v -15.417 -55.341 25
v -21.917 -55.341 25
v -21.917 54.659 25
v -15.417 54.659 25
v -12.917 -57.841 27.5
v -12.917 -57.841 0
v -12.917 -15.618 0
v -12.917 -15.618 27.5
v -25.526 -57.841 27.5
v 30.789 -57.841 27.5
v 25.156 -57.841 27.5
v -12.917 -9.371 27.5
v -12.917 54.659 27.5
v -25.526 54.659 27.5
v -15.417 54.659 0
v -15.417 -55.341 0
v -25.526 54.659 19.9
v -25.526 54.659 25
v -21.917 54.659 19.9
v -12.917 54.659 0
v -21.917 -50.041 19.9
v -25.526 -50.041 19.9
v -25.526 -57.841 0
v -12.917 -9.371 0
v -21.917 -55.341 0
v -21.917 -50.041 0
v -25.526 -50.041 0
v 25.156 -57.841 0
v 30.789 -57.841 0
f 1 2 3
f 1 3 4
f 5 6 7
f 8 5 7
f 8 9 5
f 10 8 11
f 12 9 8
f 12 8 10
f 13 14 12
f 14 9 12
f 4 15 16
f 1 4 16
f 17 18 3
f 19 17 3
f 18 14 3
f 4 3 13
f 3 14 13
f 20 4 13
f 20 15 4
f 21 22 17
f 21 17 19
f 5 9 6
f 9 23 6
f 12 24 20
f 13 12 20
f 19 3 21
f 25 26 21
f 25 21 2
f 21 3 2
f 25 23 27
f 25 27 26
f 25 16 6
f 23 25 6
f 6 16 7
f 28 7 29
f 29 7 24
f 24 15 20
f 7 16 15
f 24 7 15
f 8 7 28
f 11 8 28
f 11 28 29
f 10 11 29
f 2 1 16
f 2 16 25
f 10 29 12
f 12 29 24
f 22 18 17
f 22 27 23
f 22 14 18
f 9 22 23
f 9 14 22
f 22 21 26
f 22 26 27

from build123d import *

# Parameters (mm, degrees)
F1_DEPTH = 25
F3_DEPTH = 2.5
F4_W     = 3.6095191927
F4_H     = 104.7
F5_DEPTH = 5.1
F6_DEPTH = 2.5


with BuildPart() as f1:
    # F0 (on Top) → F1 (new body)
    with BuildSketch(Plane.XY):
        Polygon((-21.9167374188, -55.3413778543), (-21.9167374188, -50.0413778543), (-25.5262566115, -50.0413778543), (-25.5262566115, -57.8413778543), (-12.9167374188, -57.8413778543), (-12.9167374188, -15.6176477188), (-12.9167374188, -9.371153079), (-12.9167374188, 34.286143216), (-12.9167374188, 54.6586221457), (-15.4167374188, 54.6586221457), (-15.4167374188, -55.3413778543), (-21.4532855898, -55.3413778543), align=None)
        Polygon((-12.9167374188, -9.371153079), (-12.9167374188, -15.6176477188), (25.1562967896, -57.8413778543), (30.7887457311, -57.8413778543), align=None)
    extrude(amount=F1_DEPTH)

    # F2 (on face) → F3 (join)
    with BuildSketch(Plane.XY.offset(25)):
        Polygon((-15.4167374188, -55.3413778543), (-15.4167374188, 54.6586221457), (-25.5262566115, 54.6586221457), (-25.5262566115, -50.0413778543), (-21.9167374188, -50.0413778543), (-21.9167374188, -55.3413778543), align=None)
        Polygon((-12.9167374188, -9.371153079), (-12.9167374188, 54.6586221457), (-15.4167374188, 54.6586221457), (-15.4167374188, -55.3413778543), (-21.9167374188, -55.3413778543), (-21.9167374188, -50.0413778543), (-25.5262566115, -50.0413778543), (-25.5262566115, -57.8413778543), (-12.9167374188, -57.8413778543), (-12.9167374188, -15.6176477188), align=None)
    extrude(amount=F3_DEPTH)

    # F4 (on face) → F5 (join)
    with BuildSketch(Plane(origin=(0, 0, 25), x_dir=(1, 0, 0), z_dir=(0, 0, -1))):
        with Locations((-23.7214970151, -2.3086221457)):
            Rectangle(F4_W, F4_H)
    extrude(amount=F5_DEPTH)

    # F6 (add, through all): a face of the model
    f6_faces = [f1.faces().sort_by_distance(p)[0] for p in [
        (7.5602195643, -35.1320371457, 25),
    ]]
    extrude(f6_faces, amount=F6_DEPTH)


solid = f1.part
